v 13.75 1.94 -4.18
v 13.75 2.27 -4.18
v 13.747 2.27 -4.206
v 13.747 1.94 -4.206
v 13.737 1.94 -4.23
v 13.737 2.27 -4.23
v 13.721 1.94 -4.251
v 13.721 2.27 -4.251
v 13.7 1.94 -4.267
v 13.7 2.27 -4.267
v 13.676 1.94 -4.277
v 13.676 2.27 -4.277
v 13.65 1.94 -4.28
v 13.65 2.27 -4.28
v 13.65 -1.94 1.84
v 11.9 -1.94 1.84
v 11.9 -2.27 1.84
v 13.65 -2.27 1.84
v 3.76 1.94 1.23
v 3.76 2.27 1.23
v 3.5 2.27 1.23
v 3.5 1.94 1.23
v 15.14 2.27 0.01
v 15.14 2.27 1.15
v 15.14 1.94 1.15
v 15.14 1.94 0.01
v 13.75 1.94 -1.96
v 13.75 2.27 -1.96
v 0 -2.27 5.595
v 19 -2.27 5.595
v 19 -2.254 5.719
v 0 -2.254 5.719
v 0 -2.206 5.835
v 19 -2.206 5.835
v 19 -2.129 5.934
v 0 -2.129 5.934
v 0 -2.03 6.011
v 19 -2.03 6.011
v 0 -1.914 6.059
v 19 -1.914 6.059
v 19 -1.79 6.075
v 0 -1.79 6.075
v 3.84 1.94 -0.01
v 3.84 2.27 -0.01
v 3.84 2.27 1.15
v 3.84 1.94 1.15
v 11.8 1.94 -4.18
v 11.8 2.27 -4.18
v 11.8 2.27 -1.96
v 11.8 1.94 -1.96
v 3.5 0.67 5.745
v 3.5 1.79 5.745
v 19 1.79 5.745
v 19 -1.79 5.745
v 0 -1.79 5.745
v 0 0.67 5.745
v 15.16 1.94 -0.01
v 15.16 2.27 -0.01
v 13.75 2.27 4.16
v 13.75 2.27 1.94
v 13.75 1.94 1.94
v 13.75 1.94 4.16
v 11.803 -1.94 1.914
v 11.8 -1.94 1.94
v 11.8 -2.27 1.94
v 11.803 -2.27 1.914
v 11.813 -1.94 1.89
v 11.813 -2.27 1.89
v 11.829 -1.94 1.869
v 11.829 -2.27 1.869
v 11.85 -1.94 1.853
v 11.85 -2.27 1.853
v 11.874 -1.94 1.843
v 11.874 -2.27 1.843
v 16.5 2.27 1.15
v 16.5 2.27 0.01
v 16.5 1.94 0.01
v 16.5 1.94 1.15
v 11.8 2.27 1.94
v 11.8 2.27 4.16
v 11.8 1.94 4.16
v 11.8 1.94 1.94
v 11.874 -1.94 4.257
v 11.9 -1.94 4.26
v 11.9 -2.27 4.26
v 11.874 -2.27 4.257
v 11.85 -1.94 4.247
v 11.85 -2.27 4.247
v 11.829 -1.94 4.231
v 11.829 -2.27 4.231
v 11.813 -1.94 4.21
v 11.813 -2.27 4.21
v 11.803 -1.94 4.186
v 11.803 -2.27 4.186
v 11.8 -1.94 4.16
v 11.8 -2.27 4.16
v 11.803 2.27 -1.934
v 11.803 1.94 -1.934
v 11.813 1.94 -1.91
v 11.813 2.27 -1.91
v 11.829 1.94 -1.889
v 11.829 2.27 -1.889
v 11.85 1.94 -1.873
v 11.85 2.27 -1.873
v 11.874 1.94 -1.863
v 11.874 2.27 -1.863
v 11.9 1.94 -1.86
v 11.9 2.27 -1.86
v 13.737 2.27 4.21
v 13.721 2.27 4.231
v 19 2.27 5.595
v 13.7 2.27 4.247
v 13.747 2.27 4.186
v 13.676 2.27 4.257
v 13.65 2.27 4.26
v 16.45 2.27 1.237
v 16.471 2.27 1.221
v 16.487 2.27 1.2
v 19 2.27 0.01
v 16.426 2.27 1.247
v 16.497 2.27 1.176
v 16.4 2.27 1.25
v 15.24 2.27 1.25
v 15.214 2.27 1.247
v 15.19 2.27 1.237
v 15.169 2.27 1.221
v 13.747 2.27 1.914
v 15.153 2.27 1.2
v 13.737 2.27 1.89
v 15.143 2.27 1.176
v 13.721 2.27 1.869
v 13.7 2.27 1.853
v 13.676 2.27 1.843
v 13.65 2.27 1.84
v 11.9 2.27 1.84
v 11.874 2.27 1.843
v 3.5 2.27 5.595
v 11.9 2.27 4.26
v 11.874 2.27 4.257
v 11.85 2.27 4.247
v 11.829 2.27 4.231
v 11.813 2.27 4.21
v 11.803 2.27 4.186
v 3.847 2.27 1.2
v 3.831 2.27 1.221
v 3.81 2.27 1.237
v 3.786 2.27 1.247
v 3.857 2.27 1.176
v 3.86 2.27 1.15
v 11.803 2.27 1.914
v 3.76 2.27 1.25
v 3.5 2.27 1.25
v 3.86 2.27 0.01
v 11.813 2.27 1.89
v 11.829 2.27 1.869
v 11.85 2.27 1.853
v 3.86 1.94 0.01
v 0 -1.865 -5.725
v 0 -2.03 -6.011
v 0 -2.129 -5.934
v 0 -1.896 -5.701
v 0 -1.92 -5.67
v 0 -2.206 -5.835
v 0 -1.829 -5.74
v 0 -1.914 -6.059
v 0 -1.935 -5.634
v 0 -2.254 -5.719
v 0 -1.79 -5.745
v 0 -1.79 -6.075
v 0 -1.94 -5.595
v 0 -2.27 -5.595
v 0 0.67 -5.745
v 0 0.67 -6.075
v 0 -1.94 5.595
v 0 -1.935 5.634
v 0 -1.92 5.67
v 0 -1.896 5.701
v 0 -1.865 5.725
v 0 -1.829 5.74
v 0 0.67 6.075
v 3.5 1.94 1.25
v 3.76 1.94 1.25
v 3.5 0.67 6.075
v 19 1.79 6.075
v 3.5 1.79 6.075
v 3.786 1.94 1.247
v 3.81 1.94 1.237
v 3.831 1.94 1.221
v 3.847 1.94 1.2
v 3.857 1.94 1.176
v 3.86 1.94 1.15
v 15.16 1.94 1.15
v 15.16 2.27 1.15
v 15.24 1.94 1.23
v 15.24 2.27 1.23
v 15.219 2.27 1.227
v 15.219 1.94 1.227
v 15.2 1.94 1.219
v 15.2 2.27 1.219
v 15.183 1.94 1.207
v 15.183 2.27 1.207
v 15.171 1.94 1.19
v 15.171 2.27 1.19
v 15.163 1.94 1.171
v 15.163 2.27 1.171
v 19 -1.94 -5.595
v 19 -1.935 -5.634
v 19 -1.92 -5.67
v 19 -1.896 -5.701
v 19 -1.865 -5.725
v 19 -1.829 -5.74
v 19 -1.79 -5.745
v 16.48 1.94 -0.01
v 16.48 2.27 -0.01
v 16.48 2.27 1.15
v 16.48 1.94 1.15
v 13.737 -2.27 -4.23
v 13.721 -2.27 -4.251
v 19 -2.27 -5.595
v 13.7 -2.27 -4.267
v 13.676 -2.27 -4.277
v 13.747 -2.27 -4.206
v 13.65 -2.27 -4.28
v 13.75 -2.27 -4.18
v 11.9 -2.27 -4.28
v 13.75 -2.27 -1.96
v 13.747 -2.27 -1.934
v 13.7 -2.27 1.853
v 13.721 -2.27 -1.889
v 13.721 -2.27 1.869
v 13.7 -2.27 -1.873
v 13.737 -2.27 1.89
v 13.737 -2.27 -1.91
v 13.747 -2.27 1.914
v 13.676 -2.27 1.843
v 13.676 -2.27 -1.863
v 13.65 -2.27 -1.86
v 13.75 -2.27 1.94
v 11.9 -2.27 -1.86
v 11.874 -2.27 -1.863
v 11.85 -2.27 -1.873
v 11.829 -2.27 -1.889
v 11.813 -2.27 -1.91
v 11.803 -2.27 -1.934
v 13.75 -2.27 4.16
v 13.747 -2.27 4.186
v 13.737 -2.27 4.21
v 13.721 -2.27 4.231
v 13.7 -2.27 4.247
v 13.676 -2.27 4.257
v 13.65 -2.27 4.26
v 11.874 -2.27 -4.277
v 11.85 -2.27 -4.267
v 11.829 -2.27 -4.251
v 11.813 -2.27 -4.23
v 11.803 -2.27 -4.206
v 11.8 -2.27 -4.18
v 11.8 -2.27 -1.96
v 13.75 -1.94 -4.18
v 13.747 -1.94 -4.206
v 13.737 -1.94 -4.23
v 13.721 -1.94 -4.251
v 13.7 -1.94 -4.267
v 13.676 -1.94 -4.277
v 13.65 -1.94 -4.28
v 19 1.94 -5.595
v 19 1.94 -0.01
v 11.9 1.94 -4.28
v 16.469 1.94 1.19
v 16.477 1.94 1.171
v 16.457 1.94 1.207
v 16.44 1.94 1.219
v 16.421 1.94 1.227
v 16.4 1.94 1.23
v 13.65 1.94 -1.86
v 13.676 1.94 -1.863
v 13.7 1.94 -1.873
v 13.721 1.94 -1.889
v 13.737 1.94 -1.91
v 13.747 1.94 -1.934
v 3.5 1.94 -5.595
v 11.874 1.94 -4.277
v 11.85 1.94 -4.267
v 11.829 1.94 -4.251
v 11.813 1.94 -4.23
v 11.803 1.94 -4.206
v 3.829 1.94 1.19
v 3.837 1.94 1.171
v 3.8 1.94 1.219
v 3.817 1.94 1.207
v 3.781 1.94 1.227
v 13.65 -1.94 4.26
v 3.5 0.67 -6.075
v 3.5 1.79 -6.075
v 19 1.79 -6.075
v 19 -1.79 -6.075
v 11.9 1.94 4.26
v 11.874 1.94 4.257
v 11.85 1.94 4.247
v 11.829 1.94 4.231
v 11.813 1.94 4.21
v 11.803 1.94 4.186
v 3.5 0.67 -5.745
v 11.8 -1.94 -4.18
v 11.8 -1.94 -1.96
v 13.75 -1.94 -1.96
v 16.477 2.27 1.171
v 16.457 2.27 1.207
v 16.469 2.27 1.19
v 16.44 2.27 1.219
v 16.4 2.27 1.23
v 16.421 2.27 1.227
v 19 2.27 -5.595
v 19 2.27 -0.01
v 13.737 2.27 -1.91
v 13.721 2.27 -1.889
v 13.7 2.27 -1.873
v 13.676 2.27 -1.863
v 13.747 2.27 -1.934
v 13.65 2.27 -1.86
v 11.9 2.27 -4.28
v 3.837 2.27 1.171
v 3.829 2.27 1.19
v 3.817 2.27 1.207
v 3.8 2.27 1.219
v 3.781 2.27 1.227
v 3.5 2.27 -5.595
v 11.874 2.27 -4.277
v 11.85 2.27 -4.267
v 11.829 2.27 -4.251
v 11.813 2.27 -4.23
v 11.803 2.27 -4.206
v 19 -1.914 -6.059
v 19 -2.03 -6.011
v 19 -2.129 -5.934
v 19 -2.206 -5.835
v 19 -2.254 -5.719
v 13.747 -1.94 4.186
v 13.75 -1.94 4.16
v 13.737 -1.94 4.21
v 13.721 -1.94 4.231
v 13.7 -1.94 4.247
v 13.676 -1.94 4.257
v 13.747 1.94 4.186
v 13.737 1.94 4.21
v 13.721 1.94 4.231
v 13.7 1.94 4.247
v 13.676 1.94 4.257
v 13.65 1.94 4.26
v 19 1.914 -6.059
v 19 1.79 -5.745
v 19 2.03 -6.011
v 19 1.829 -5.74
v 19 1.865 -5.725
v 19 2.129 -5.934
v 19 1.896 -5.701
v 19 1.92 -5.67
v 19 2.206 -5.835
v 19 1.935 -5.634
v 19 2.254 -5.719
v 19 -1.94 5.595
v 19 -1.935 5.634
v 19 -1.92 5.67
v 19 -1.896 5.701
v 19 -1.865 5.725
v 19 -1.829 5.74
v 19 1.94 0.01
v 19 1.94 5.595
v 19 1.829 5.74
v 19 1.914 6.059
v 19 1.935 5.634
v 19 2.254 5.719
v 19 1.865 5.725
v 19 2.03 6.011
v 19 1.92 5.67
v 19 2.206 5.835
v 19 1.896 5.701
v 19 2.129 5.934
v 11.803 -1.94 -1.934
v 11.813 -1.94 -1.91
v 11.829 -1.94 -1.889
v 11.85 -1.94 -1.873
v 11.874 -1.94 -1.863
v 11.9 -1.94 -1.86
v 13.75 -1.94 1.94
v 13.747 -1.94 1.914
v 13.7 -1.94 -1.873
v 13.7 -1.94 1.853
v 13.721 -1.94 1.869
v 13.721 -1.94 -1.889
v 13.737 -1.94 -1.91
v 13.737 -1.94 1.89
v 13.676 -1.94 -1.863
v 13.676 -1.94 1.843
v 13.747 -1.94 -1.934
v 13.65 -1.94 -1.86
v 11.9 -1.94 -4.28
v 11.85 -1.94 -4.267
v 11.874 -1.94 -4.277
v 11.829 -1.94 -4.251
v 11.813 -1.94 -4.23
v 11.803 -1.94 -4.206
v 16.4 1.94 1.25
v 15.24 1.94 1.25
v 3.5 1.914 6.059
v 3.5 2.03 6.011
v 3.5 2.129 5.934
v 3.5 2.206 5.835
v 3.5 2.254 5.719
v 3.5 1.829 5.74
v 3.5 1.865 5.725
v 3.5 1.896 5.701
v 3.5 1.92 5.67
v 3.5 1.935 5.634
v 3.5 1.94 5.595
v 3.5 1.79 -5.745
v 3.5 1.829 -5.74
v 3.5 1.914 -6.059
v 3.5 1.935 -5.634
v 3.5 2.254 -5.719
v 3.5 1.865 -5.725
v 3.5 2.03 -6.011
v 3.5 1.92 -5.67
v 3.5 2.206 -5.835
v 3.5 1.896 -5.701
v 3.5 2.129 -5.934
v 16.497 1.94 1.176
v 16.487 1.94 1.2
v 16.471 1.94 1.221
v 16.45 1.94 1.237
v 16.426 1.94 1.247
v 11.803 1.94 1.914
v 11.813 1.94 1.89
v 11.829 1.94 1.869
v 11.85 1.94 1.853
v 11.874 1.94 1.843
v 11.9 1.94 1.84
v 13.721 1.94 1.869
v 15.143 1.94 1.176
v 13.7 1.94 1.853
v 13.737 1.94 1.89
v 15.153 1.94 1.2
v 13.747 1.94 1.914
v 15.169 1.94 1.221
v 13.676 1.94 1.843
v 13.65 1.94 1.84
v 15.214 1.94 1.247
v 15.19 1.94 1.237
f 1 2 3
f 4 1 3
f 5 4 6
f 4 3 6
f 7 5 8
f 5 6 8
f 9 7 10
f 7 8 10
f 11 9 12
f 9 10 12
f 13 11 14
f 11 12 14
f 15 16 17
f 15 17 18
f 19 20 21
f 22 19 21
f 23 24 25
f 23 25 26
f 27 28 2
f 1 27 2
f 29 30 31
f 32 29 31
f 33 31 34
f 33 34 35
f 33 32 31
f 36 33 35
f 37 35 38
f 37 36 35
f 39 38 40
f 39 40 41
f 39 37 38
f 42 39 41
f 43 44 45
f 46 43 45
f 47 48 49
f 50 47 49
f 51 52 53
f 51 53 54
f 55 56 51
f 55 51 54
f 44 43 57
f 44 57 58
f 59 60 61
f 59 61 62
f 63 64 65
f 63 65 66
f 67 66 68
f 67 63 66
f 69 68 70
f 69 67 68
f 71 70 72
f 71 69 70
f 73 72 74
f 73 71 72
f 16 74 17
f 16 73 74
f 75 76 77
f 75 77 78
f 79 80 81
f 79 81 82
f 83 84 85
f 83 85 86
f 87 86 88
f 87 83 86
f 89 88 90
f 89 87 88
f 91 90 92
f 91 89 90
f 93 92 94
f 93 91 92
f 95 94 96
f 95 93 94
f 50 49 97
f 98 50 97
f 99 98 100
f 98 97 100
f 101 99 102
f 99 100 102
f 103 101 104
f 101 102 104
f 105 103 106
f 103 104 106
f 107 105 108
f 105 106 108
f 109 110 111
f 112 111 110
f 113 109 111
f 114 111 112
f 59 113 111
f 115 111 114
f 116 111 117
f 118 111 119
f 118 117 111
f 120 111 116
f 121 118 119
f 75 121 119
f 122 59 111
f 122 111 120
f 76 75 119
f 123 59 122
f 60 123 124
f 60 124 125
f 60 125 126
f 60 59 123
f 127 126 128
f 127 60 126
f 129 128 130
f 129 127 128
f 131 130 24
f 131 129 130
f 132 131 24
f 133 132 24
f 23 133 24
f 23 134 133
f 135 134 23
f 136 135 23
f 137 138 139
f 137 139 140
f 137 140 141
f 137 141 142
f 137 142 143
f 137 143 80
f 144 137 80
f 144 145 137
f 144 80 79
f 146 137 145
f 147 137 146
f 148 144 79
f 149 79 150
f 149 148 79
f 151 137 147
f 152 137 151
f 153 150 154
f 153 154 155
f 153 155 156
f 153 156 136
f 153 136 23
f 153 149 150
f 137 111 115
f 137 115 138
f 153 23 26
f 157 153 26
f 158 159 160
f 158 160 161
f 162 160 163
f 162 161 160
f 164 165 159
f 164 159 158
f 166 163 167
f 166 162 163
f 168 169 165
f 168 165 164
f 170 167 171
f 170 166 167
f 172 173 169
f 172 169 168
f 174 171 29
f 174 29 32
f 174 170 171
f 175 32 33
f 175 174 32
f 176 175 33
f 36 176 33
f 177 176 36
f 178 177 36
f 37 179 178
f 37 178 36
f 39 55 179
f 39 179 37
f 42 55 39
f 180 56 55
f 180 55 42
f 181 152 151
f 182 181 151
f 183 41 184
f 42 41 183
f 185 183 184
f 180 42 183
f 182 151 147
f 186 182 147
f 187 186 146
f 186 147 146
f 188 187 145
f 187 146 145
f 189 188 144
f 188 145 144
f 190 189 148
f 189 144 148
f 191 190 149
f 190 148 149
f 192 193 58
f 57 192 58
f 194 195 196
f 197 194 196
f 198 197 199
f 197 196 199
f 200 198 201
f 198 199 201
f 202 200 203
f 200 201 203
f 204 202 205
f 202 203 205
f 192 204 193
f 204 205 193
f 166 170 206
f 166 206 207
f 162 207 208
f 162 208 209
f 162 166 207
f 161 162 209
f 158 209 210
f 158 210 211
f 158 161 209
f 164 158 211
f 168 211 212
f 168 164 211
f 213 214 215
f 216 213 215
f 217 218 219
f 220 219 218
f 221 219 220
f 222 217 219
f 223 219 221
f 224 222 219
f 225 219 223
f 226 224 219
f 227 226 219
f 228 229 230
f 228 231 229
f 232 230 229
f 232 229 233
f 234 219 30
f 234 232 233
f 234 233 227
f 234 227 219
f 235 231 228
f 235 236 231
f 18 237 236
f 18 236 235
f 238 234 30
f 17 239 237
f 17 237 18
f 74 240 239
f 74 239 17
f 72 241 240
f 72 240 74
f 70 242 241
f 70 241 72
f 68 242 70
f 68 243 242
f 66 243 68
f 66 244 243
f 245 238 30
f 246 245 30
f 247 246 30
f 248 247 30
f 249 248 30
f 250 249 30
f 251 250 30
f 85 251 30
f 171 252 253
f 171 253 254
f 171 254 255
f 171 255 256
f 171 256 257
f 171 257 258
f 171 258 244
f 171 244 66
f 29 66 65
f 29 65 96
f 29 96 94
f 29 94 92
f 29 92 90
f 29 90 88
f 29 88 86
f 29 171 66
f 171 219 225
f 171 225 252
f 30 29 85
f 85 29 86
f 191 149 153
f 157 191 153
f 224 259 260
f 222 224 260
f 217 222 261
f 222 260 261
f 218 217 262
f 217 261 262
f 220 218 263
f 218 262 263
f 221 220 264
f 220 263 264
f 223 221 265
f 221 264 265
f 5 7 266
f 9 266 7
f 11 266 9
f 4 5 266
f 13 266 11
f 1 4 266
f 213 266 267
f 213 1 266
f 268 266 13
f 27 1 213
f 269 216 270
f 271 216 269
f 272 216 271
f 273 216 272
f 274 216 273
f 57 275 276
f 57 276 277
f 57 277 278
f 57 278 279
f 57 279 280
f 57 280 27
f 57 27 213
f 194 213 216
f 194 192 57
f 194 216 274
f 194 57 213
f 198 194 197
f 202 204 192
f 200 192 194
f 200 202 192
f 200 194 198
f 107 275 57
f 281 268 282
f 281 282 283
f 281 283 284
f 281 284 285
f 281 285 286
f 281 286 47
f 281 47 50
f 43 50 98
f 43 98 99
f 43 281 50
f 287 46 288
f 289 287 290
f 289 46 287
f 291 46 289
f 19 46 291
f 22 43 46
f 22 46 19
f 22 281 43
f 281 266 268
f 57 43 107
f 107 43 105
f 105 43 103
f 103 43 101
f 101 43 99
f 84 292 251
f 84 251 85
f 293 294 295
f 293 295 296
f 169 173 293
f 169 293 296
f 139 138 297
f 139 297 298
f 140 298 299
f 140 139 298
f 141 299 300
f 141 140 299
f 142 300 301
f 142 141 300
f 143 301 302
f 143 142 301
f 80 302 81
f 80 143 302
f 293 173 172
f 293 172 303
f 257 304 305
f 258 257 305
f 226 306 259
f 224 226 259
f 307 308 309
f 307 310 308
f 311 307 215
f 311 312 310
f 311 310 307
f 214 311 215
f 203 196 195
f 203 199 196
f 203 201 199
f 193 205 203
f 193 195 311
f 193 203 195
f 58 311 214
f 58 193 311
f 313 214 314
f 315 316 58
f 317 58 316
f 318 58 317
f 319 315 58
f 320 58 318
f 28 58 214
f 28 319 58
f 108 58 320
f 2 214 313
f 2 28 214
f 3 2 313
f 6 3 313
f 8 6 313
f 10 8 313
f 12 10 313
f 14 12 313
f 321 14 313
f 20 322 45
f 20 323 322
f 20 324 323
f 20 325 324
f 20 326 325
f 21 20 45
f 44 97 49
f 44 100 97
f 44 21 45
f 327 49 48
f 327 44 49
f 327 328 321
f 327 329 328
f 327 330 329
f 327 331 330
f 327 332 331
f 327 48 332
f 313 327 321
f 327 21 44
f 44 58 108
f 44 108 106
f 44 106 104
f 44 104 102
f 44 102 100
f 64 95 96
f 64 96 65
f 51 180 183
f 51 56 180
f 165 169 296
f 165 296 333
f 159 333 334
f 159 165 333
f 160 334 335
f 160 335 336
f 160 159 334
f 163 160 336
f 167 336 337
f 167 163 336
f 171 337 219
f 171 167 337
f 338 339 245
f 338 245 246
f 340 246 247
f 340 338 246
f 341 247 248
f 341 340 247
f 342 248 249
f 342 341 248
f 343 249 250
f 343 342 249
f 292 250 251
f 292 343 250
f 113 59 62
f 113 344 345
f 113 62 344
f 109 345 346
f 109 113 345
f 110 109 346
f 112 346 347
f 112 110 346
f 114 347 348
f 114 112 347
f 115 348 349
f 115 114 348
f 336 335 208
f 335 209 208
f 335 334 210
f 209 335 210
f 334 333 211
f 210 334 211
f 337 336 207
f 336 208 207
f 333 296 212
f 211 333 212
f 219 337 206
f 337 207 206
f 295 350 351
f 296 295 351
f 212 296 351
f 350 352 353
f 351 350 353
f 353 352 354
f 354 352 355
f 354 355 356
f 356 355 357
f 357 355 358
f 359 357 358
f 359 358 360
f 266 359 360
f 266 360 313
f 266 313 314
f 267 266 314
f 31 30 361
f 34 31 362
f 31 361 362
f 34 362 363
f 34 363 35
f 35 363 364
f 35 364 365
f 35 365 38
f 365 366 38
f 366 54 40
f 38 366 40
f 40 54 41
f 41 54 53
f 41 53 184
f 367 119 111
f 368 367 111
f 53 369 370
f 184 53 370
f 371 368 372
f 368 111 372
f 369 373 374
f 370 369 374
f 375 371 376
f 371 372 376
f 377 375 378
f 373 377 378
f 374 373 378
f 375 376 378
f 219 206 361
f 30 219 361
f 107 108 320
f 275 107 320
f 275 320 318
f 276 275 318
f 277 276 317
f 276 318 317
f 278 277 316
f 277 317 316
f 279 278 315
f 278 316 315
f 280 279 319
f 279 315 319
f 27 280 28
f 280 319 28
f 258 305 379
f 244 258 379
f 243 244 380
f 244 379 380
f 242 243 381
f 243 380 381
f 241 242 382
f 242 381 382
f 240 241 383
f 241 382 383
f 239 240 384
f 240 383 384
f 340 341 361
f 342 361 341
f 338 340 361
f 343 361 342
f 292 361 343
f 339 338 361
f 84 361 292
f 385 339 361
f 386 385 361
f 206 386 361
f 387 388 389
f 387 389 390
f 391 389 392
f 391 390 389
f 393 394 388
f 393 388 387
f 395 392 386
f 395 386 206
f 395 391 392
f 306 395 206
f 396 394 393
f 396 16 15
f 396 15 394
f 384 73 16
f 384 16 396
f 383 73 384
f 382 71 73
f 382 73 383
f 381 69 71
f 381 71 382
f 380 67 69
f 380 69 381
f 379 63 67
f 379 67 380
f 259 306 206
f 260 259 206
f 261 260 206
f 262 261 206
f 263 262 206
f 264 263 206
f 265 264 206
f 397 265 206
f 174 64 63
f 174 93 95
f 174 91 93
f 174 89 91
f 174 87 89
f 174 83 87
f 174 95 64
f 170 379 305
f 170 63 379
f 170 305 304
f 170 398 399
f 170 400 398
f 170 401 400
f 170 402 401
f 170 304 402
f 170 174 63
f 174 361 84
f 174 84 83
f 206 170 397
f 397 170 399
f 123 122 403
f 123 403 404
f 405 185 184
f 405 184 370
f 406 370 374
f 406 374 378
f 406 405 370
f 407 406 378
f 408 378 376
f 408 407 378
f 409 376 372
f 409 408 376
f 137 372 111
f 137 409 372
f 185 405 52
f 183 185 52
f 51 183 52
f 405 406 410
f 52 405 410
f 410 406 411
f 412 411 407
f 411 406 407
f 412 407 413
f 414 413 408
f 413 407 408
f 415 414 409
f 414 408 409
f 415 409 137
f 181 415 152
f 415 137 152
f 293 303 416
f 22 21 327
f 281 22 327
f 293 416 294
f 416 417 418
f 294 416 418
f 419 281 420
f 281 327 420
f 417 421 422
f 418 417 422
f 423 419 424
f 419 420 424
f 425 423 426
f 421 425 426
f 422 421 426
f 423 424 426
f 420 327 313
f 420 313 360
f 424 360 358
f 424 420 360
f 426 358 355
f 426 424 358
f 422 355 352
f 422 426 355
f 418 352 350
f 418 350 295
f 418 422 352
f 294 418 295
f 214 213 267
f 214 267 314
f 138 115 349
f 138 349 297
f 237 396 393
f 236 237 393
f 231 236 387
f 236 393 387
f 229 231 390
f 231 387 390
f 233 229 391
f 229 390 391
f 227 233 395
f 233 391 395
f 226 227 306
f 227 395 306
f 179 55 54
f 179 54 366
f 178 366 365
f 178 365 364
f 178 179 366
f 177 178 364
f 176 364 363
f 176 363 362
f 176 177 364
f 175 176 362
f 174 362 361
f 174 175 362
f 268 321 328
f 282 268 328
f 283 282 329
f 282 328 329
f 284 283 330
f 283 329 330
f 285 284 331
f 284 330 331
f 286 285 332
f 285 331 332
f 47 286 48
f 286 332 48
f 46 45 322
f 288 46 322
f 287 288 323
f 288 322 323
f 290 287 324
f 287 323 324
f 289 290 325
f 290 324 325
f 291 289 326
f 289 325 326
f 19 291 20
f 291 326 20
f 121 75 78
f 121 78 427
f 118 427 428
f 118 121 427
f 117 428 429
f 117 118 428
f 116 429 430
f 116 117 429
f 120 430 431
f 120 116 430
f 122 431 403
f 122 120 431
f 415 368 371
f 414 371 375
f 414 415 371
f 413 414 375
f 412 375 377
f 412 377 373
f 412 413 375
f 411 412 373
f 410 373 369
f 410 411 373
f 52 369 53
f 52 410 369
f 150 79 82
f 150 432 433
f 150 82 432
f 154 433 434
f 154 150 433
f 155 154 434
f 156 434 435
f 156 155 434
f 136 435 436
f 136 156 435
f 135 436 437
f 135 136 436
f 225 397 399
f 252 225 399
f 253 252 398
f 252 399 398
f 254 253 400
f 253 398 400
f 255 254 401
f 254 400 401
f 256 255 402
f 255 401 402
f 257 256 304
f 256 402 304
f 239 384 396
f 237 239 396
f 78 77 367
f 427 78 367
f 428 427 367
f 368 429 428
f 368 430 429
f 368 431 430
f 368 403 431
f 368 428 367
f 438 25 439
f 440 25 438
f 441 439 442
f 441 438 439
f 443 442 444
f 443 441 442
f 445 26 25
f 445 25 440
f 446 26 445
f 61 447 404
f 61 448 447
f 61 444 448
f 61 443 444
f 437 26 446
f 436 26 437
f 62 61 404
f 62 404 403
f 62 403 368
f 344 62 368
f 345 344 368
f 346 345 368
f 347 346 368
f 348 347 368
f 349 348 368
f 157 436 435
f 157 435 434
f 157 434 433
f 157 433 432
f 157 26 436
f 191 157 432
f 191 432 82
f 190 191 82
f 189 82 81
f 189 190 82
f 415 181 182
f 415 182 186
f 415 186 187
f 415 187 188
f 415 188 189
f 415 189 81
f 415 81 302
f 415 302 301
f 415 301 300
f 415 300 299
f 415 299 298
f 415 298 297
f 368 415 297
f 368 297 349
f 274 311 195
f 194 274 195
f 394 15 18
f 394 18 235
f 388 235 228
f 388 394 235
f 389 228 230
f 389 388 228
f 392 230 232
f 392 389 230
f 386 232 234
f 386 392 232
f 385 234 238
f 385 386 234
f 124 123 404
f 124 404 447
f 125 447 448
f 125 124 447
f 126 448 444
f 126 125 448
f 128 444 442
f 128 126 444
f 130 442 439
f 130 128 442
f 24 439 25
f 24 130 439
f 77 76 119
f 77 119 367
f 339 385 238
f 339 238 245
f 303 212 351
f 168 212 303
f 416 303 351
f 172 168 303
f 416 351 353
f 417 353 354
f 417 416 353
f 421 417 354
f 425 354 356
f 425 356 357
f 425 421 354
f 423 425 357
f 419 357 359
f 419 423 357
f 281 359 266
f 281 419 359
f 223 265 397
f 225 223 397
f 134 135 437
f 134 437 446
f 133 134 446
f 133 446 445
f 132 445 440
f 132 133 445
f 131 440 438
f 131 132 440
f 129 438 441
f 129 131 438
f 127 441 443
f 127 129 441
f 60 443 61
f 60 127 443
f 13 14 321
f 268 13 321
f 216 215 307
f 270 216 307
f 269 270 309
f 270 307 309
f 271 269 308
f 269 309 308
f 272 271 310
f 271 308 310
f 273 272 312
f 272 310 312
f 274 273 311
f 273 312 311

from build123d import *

# Parameters (mm, degrees)
BASE_FLANGE1_DEPTH  = 19
CUT_EXTRUDE1_DEPTH  = 0.33
TAB1_DEPTH          = 0.33
CUT_EXTRUDE2_DEPTH  = 21.457693541
SKETCH_1_W          = 4.170383739
SKETCH_1_H          = 15.60949608
CUT_EXTRUDE_1_DEPTH = 1.6


# Sheet-metal steps are written as plain solids
with BuildPart() as part:
    # Sketch1 → Base-Flange1 (new body)
    with BuildSketch(Plane(origin=(0, 0, 0), x_dir=(0, 0, -1), z_dir=(1, 0, 0))):
        with BuildLine():
            Line((0.01, 2.27), (5.595, 2.27))
            ThreePointArc((5.595, 2.27), (5.934411255, 2.129411255), (6.075, 1.79))
            Line((6.075, 1.79), (6.075, -1.79))
            ThreePointArc((6.075, -1.79), (5.934411255, -2.129411255), (5.595, -2.27))
            Line((5.595, -2.27), (-5.595, -2.27))
            ThreePointArc((-5.595, -2.27), (-5.934411255, -2.129411255), (-6.075, -1.79))
            Line((-6.075, -1.79), (-6.075, 1.79))
            ThreePointArc((-6.075, 1.79), (-5.934411255, 2.129411255), (-5.595, 2.27))
            Line((-5.595, 2.27), (-0.01, 2.27))
            Line((-0.01, 2.27), (-0.01, 1.94))
            Line((-0.01, 1.94), (-5.595, 1.94))
            ThreePointArc((-5.595, 1.94), (-5.701066017, 1.896066017), (-5.745, 1.79))
            Line((-5.745, 1.79), (-5.745, -1.79))
            ThreePointArc((-5.745, -1.79), (-5.701066017, -1.896066017), (-5.595, -1.94))
            Line((-5.595, -1.94), (5.595, -1.94))
            ThreePointArc((5.595, -1.94), (5.701066017, -1.896066017), (5.745, -1.79))
            Line((5.745, -1.79), (5.745, 1.79))
            ThreePointArc((5.745, 1.79), (5.701066017, 1.896066017), (5.595, 1.94))
            Line((5.595, 1.94), (0.01, 1.94))
            Line((0.01, 1.94), (0.01, 2.27))
        make_face()
    extrude(amount=BASE_FLANGE1_DEPTH)

    # Sketch6 → Cut-Extrude1 (cut)
    with BuildSketch(Plane(origin=(0, 2.27, 0), x_dir=(1, 0, 0), z_dir=(0, 1, 0))):
        with BuildLine():
            Line((16.5, 0.01), (16.5, -1.15))
            ThreePointArc((16.5, -1.15), (16.470710678, -1.220710678), (16.4, -1.25))
            Line((16.4, -1.25), (15.24, -1.25))
            ThreePointArc((15.24, -1.25), (15.169289322, -1.220710678), (15.14, -1.15))
            Line((15.14, -1.15), (15.14, 0.01))
            Line((15.14, 0.01), (16.5, 0.01))
        make_face()
        with BuildLine():
            Line((3.86, 0.01), (2.5, 0.01))
            Line((2.5, 0.01), (2.5, -1.15))
            ThreePointArc((2.5, -1.15), (2.529289322, -1.220710678), (2.6, -1.25))
            Line((2.6, -1.25), (3.76, -1.25))
            ThreePointArc((3.76, -1.25), (3.830710678, -1.220710678), (3.86, -1.15))
            Line((3.86, -1.15), (3.86, 0.01))
        make_face()
    extrude(amount=-CUT_EXTRUDE1_DEPTH, mode=Mode.SUBTRACT)

    # Sketch7 → Tab1 (add)
    with BuildSketch(Plane(origin=(0, 2.27, 0), x_dir=(1, 0, 0), z_dir=(0, 1, 0))):
        with BuildLine():
            Line((15.16, -0.01), (15.16, 0.01))
            Line((15.16, 0.01), (16.48, 0.01))
            Line((16.48, 0.01), (16.48, -0.01))
            Line((16.48, -0.01), (16.48, -1.15))
            ThreePointArc((16.48, -1.15), (16.456568542, -1.206568542), (16.4, -1.23))
            Line((16.4, -1.23), (15.24, -1.23))
            ThreePointArc((15.24, -1.23), (15.183431458, -1.206568542), (15.16, -1.15))
            Line((15.16, -1.15), (15.16, -0.01))
        make_face()
        with BuildLine():
            Line((2.52, -0.01), (2.52, 0.01))
            Line((2.52, 0.01), (3.84, 0.01))
            Line((3.84, 0.01), (3.84, -0.01))
            Line((3.84, -0.01), (3.84, -1.15))
            ThreePointArc((3.84, -1.15), (3.816568542, -1.206568542), (3.76, -1.23))
            Line((3.76, -1.23), (2.6, -1.23))
            ThreePointArc((2.6, -1.23), (2.543431458, -1.206568542), (2.52, -1.15))
            Line((2.52, -1.15), (2.52, -0.01))
        make_face()
    extrude(amount=-TAB1_DEPTH)

    # Sketch10 → Cut-Extrude2 (cut, through all)
    with BuildSketch(Plane(origin=(0, 2.27, 0), x_dir=(1, 0, 0), z_dir=(0, 1, 0))):
        with BuildLine():
            Line((11.9, -1.84), (13.65, -1.84))
            ThreePointArc((13.65, -1.84), (13.720710678, -1.869289322), (13.75, -1.94))
            Line((13.75, -1.94), (13.75, -4.16))
            ThreePointArc((13.75, -4.16), (13.720710678, -4.230710678), (13.65, -4.26))
            Line((13.65, -4.26), (11.9, -4.26))
            ThreePointArc((11.9, -4.26), (11.829289322, -4.230710678), (11.8, -4.16))
            Line((11.8, -4.16), (11.8, -1.94))
            ThreePointArc((11.8, -1.94), (11.829289322, -1.869289322), (11.9, -1.84))
        make_face()
        with BuildLine():
            Line((13.75, 1.96), (13.75, 4.18))
            ThreePointArc((13.75, 4.18), (13.720710678, 4.250710678), (13.65, 4.28))
            Line((13.65, 4.28), (11.9, 4.28))
            ThreePointArc((11.9, 4.28), (11.829289322, 4.250710678), (11.8, 4.18))
            Line((11.8, 4.18), (11.8, 1.96))
            ThreePointArc((11.8, 1.96), (11.829289322, 1.889289322), (11.9, 1.86))
            Line((11.9, 1.86), (13.65, 1.86))
            ThreePointArc((13.65, 1.86), (13.720710678, 1.889289322), (13.75, 1.96))
        make_face()
    extrude(amount=-CUT_EXTRUDE2_DEPTH, mode=Mode.SUBTRACT)

    # Эскиз1 → Вырез-Вытянуть1 (cut)
    with BuildSketch(Plane(origin=(0, 2.27, 0), x_dir=(1, 0, 0), z_dir=(0, 1, 0))):
        with Locations((1.41480813, -0.01)):
            Rectangle(SKETCH_1_W, SKETCH_1_H)
    extrude(amount=-CUT_EXTRUDE_1_DEPTH, mode=Mode.SUBTRACT)


solid = part.part
